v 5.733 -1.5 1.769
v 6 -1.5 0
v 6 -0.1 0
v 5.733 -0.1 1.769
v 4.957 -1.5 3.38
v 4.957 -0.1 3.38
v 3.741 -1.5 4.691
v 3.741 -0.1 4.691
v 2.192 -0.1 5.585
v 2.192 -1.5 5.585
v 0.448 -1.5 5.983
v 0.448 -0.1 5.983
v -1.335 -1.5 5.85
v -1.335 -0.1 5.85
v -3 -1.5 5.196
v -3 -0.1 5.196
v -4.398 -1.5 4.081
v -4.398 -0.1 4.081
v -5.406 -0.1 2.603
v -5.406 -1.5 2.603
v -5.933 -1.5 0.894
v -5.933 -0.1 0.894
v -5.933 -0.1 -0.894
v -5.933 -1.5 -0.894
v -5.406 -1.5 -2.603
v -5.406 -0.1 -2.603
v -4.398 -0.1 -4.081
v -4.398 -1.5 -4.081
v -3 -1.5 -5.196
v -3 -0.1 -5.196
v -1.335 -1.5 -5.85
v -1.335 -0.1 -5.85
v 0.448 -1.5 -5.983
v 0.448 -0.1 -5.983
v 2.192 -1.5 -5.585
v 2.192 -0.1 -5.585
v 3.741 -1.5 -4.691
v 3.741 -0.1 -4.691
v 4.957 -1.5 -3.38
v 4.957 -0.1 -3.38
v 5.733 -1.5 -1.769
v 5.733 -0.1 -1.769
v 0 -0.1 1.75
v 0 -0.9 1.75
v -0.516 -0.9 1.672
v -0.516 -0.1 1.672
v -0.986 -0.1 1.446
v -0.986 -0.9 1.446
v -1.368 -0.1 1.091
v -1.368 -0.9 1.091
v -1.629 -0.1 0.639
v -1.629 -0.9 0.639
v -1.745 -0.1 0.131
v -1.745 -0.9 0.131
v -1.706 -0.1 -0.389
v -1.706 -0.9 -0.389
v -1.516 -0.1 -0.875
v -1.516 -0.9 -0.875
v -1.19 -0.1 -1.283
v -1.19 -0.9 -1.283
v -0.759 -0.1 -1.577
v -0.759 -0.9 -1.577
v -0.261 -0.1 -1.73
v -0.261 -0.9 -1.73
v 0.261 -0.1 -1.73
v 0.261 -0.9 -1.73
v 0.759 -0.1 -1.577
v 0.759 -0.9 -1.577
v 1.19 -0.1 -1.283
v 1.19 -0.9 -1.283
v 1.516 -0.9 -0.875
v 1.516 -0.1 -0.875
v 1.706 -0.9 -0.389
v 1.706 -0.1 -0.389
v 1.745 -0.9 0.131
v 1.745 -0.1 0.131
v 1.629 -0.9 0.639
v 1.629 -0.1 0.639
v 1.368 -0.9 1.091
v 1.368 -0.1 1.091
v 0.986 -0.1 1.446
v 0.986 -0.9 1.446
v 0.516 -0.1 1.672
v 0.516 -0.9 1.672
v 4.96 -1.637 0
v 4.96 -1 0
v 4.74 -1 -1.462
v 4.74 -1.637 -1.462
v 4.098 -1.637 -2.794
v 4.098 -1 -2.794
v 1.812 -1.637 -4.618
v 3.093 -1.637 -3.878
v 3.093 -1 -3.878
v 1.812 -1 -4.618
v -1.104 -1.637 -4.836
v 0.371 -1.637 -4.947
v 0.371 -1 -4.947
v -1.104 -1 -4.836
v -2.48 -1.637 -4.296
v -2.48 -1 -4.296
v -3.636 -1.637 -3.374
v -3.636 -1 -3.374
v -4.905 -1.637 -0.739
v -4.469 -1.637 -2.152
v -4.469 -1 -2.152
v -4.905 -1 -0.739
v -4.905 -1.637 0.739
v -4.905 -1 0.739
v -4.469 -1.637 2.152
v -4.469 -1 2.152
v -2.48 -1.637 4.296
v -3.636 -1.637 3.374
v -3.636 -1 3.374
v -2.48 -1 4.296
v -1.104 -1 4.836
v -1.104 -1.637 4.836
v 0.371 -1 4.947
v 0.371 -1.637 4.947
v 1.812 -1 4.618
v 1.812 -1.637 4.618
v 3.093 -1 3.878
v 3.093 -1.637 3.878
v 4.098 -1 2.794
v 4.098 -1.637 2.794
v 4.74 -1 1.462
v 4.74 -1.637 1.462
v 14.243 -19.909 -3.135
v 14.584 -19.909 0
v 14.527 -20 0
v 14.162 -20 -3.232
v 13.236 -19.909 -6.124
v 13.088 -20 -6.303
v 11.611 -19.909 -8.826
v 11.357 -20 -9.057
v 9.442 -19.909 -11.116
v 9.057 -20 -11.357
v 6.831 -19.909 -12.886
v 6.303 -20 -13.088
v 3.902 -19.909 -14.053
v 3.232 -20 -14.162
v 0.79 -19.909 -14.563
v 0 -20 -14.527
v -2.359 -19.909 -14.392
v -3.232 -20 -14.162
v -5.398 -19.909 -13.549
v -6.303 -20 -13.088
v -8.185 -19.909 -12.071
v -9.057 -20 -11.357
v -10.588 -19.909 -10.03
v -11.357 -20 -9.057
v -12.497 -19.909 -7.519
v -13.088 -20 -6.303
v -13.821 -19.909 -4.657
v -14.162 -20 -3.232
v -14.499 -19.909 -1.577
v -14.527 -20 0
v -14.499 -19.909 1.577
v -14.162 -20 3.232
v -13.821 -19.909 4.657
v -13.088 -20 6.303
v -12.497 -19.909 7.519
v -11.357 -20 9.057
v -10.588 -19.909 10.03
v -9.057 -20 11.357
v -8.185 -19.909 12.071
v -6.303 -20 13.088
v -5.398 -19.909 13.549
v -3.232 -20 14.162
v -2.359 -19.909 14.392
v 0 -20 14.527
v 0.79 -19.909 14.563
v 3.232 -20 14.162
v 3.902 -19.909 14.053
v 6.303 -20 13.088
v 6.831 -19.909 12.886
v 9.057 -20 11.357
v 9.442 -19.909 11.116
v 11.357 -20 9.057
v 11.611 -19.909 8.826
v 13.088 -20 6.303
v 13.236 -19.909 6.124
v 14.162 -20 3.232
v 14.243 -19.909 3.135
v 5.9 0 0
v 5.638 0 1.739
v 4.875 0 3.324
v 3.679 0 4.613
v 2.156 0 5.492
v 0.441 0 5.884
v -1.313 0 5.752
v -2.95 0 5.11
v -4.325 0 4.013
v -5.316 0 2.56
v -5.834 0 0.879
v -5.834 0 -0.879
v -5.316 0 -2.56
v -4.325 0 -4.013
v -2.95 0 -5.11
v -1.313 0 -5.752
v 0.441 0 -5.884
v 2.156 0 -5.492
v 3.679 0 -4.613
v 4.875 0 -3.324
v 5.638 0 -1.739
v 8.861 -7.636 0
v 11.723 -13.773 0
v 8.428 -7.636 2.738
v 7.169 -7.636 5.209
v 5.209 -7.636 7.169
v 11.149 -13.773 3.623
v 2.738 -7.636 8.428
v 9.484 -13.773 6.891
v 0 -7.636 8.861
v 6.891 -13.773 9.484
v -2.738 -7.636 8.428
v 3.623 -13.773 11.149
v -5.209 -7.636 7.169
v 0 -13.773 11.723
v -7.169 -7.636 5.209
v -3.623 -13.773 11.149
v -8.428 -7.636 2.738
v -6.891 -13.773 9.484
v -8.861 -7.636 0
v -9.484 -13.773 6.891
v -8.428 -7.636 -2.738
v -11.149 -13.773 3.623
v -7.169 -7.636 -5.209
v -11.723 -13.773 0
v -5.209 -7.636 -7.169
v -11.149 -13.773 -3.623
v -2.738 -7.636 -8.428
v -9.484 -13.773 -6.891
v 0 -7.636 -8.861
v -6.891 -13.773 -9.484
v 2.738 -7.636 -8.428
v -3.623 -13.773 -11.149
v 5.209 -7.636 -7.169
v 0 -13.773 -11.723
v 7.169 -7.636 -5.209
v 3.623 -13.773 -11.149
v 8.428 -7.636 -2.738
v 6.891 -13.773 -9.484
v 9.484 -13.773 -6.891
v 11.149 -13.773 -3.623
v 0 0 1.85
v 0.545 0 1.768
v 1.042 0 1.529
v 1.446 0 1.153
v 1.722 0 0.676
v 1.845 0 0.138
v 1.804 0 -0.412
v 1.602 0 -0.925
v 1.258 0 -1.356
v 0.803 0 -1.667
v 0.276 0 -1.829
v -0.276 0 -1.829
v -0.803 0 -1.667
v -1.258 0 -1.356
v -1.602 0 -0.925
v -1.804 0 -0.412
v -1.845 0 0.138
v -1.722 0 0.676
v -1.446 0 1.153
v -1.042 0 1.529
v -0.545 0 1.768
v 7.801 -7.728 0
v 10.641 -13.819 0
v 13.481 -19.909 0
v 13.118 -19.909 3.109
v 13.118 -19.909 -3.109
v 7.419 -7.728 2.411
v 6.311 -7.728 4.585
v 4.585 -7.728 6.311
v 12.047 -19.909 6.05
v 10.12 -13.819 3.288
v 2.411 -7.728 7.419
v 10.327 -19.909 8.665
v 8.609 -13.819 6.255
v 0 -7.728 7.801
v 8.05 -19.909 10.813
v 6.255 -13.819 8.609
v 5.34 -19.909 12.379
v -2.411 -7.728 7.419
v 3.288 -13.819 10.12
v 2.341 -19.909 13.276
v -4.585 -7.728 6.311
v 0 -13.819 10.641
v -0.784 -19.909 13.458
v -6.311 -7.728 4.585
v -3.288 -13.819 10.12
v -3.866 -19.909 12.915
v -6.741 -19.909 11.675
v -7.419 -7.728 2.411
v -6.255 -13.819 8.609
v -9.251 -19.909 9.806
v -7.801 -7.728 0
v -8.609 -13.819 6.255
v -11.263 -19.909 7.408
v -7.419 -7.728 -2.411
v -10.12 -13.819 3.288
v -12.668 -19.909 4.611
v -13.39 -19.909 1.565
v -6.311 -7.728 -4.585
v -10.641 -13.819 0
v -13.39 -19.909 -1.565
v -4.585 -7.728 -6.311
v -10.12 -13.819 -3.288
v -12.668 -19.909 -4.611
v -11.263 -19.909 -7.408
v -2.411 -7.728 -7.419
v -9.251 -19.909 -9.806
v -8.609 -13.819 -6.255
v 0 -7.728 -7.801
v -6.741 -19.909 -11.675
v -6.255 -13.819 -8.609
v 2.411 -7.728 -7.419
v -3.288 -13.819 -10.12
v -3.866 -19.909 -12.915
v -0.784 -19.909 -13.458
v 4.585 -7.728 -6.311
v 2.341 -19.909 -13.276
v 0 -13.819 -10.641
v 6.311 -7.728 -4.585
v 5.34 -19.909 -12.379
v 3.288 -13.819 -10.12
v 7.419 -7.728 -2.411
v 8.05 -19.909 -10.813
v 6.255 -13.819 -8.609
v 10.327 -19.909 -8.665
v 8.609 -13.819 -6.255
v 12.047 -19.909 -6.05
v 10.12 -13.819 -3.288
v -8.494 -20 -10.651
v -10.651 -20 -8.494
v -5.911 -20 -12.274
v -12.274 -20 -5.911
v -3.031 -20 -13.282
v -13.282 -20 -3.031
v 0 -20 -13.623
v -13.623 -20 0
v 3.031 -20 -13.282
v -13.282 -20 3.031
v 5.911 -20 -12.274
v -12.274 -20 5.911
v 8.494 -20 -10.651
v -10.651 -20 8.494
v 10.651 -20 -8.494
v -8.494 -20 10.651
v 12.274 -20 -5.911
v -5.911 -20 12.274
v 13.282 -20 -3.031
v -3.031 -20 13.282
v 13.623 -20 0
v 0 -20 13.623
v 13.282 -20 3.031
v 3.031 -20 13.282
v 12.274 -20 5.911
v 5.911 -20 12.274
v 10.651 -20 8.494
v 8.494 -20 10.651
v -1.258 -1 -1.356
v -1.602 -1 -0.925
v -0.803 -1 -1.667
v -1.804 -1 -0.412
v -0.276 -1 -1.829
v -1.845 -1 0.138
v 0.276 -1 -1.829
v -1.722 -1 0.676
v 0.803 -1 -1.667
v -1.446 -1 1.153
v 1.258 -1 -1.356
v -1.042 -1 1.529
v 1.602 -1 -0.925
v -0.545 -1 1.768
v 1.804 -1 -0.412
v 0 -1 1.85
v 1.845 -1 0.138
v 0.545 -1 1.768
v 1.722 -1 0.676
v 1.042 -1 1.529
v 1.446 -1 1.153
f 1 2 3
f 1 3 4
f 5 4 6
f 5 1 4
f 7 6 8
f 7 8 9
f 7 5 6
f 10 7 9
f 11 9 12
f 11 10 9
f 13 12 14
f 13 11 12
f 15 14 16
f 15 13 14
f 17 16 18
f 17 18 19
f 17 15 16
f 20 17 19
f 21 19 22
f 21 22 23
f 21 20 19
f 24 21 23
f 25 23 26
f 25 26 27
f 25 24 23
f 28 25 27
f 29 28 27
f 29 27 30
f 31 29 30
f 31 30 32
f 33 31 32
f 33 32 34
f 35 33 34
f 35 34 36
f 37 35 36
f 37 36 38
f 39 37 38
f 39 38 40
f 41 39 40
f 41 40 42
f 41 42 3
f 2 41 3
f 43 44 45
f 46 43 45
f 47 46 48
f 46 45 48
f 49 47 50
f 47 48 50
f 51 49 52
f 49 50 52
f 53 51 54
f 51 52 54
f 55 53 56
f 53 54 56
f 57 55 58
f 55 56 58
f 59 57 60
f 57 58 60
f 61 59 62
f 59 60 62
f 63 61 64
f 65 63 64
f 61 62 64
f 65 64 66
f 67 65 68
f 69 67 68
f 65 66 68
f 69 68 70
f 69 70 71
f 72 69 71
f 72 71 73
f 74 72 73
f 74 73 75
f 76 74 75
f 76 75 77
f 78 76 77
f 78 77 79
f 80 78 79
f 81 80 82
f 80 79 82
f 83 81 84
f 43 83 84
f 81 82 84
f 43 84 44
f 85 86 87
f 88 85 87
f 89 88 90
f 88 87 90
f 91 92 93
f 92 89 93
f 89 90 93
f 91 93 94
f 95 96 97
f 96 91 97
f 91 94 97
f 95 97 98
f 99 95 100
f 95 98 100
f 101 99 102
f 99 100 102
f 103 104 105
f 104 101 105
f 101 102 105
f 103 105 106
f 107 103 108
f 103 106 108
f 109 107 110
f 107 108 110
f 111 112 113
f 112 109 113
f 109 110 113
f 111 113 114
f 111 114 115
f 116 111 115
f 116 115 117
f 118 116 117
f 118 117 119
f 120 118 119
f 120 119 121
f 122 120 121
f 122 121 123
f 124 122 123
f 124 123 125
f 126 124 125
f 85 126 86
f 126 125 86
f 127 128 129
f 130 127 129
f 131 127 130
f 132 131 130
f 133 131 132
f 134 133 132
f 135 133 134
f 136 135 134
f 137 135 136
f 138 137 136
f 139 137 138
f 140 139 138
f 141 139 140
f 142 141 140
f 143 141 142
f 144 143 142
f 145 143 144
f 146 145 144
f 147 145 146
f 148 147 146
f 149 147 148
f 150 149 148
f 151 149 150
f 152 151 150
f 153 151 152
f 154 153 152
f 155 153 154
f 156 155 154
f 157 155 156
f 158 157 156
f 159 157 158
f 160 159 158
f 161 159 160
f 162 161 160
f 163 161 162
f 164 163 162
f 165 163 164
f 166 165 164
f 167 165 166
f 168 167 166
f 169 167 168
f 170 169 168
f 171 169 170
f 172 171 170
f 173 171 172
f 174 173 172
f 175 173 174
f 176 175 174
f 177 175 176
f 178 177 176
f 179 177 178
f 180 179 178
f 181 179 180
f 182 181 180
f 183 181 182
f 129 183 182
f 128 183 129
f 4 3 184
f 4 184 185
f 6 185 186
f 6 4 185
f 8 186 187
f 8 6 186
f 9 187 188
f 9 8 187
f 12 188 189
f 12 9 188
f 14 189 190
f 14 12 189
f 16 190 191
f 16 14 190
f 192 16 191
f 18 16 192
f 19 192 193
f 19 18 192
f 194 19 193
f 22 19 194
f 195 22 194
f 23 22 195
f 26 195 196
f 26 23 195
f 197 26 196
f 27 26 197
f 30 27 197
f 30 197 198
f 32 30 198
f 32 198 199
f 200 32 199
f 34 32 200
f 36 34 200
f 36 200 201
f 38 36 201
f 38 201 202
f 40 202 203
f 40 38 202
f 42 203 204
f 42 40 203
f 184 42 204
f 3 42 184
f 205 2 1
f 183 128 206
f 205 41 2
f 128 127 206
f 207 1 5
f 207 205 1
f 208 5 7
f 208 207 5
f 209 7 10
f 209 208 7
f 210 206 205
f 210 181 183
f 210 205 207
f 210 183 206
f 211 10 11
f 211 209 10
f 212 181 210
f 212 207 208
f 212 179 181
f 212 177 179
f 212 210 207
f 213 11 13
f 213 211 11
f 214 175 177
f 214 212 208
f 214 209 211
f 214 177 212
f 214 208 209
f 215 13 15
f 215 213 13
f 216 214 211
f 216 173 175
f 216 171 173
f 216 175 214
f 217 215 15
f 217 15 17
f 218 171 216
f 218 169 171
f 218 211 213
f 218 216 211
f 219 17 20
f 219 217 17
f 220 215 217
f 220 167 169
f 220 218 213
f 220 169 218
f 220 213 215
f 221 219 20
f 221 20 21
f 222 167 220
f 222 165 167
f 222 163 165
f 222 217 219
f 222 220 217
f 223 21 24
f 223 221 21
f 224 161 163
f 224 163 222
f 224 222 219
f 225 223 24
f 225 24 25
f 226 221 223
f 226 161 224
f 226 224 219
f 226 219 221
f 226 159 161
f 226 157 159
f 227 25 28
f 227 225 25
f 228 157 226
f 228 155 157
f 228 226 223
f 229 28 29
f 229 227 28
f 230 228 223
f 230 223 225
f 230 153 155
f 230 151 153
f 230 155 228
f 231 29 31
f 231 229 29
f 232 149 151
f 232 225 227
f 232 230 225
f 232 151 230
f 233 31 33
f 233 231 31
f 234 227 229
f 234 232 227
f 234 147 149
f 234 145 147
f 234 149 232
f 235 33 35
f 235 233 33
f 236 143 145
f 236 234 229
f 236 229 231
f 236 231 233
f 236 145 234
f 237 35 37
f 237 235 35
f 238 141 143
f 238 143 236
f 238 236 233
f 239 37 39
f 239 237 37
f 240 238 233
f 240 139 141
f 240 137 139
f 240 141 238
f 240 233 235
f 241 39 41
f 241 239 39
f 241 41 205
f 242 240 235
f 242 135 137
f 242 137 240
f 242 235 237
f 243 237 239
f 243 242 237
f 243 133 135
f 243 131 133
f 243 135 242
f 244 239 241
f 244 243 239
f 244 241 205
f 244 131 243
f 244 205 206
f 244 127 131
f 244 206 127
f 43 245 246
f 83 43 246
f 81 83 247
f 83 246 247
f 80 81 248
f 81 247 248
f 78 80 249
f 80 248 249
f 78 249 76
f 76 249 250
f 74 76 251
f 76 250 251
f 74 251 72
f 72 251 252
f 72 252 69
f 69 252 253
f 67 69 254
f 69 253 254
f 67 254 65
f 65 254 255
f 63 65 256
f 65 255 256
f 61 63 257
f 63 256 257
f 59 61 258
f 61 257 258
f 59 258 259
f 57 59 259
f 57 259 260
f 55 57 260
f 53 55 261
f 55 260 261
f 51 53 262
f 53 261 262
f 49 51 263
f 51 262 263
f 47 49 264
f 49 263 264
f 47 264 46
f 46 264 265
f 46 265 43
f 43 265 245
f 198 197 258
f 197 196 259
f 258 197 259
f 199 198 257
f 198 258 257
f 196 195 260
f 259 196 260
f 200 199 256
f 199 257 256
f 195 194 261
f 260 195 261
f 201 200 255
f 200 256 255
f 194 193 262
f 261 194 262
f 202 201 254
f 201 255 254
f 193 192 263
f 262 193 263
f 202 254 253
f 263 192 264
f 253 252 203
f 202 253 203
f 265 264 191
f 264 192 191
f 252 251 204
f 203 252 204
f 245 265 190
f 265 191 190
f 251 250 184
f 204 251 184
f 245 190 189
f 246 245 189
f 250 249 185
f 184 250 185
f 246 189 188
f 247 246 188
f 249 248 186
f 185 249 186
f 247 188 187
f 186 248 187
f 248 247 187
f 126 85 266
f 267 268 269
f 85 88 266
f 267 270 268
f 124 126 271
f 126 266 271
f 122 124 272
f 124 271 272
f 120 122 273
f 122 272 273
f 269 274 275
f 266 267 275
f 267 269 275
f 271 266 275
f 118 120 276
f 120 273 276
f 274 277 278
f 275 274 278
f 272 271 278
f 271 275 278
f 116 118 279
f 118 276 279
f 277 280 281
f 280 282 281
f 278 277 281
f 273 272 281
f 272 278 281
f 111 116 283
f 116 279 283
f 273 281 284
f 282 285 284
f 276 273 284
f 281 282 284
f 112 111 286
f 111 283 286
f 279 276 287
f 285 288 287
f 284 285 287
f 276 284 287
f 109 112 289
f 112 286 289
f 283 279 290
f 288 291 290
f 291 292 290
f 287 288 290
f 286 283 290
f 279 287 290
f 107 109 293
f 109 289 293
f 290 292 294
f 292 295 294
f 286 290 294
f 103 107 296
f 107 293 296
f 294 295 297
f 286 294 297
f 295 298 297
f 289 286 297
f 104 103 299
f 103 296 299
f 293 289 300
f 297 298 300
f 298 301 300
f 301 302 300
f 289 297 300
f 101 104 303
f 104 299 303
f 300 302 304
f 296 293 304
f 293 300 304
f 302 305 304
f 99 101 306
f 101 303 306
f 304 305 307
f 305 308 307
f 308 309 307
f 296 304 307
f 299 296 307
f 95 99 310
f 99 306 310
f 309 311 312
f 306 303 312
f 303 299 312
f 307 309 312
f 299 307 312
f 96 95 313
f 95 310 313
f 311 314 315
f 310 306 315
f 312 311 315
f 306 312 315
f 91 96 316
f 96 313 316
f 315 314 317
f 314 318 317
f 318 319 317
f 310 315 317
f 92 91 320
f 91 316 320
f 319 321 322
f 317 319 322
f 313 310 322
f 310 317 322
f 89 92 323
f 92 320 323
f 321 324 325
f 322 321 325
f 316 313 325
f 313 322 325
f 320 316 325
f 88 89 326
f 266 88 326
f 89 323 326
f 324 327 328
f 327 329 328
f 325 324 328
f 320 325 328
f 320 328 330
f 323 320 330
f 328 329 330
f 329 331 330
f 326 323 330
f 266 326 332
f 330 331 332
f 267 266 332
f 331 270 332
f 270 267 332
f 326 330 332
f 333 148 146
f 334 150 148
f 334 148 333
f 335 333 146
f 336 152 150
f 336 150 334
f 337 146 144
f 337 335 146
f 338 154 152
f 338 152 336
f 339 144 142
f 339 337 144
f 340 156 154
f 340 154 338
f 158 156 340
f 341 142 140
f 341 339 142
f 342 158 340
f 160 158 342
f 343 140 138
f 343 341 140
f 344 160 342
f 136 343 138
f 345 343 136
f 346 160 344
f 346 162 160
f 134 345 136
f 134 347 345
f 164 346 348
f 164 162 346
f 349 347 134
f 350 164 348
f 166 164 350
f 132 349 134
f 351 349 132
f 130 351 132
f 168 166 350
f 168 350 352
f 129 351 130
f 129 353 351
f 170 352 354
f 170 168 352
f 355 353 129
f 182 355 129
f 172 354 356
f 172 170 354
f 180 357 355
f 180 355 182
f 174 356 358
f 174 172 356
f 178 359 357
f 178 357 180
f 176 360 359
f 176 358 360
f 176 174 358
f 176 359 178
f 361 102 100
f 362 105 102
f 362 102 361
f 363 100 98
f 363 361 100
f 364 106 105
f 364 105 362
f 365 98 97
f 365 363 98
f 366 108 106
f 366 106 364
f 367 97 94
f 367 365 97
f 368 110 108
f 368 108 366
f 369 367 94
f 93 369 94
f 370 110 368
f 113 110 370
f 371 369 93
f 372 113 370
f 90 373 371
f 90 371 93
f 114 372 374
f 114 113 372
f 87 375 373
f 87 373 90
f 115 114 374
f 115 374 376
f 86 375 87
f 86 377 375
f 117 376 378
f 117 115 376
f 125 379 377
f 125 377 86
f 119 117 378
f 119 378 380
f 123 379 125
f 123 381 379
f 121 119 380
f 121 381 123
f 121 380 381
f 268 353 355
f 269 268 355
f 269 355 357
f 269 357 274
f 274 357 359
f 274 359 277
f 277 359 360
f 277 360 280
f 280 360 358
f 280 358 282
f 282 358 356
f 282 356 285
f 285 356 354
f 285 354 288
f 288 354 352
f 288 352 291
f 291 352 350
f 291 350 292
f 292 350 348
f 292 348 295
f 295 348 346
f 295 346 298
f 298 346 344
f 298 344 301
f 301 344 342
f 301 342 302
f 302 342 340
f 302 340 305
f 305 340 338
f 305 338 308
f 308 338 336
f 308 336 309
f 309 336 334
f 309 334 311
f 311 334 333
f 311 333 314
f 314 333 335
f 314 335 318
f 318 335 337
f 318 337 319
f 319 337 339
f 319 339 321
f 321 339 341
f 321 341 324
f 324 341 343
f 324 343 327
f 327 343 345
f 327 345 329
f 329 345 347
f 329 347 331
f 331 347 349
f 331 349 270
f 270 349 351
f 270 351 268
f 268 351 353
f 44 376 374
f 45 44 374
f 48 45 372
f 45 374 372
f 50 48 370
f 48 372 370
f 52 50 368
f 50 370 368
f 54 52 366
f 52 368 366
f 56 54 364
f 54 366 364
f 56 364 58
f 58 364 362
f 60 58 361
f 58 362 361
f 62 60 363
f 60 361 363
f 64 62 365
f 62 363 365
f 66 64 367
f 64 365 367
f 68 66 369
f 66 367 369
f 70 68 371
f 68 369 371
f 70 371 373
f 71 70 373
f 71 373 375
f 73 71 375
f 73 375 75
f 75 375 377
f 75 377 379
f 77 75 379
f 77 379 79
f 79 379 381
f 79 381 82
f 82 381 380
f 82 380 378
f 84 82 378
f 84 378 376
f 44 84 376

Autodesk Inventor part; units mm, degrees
ref_plane "YZ Plane" through (0, 0, 0) normal (1, 0, 0) x (0, 1, 0)
ref_plane "XZ Plane" through (0, 0, 0) normal (0, 1, 0) x (-1, 0, 0)
ref_plane "XY Plane" through (0, 0, 0) normal (0, 0, 1) x (1, 0, 0)
sketch "Sketch1" plane through (0, 0, 0) normal (0, 0, 1) x (1, 0, 0)
  line L0 (0, 0) -> (0, -20) construction
  line L1 (0, 0) -> (6, 0)
  line L2 (6, 0) -> (6, -1.5)
  line L3 (6, -1.5) -> (14.6267, -20)
  line L4 (13.5233, -20) -> (4.9604, -1.6369)
  line L5 (4.9604, -1.6369) -> (4.9604, -1)
  line L6 (4.9604, -1) -> (0, -1)
  line L7 (0, 0) -> (0, -1)
  line L8 (14.6267, -20) -> (13.5233, -20)
  dimension "d1" = 6
  dimension "d2" = 1.5
  dimension "d3" = 25
  dimension "d4" = 20
  dimension "d5" = 1
  dimension "d6" = 1
revolve "Revolution1" add sketch "Sketch1" angle 360 about axis through (0, 0, 0) along (0, -1, 0)
chamfer "Chamfer1" distance 0.1 angle 45 3 edges at (-14.6267, -20, 0) (-13.5233, -20, 0) (-6, 0, 0)
sketch "Sketch2" plane through (0, 0, 0) normal (0, 1, 0) x (1, 0, 0)
  point P0 (0, 0)
  point P1 (0, 0)
hole "Hole1" at (0, 0, 0) direction (0, -1, 0) diameter 3.5 depth 53.6 tip angle 118
chamfer "Chamfer2" distance 0.1 angle 45 2 edges at (0, 0, -1.75) (0, -1, -1.75)
properties part number "Bell" material "Brass, Soft Yellow"
